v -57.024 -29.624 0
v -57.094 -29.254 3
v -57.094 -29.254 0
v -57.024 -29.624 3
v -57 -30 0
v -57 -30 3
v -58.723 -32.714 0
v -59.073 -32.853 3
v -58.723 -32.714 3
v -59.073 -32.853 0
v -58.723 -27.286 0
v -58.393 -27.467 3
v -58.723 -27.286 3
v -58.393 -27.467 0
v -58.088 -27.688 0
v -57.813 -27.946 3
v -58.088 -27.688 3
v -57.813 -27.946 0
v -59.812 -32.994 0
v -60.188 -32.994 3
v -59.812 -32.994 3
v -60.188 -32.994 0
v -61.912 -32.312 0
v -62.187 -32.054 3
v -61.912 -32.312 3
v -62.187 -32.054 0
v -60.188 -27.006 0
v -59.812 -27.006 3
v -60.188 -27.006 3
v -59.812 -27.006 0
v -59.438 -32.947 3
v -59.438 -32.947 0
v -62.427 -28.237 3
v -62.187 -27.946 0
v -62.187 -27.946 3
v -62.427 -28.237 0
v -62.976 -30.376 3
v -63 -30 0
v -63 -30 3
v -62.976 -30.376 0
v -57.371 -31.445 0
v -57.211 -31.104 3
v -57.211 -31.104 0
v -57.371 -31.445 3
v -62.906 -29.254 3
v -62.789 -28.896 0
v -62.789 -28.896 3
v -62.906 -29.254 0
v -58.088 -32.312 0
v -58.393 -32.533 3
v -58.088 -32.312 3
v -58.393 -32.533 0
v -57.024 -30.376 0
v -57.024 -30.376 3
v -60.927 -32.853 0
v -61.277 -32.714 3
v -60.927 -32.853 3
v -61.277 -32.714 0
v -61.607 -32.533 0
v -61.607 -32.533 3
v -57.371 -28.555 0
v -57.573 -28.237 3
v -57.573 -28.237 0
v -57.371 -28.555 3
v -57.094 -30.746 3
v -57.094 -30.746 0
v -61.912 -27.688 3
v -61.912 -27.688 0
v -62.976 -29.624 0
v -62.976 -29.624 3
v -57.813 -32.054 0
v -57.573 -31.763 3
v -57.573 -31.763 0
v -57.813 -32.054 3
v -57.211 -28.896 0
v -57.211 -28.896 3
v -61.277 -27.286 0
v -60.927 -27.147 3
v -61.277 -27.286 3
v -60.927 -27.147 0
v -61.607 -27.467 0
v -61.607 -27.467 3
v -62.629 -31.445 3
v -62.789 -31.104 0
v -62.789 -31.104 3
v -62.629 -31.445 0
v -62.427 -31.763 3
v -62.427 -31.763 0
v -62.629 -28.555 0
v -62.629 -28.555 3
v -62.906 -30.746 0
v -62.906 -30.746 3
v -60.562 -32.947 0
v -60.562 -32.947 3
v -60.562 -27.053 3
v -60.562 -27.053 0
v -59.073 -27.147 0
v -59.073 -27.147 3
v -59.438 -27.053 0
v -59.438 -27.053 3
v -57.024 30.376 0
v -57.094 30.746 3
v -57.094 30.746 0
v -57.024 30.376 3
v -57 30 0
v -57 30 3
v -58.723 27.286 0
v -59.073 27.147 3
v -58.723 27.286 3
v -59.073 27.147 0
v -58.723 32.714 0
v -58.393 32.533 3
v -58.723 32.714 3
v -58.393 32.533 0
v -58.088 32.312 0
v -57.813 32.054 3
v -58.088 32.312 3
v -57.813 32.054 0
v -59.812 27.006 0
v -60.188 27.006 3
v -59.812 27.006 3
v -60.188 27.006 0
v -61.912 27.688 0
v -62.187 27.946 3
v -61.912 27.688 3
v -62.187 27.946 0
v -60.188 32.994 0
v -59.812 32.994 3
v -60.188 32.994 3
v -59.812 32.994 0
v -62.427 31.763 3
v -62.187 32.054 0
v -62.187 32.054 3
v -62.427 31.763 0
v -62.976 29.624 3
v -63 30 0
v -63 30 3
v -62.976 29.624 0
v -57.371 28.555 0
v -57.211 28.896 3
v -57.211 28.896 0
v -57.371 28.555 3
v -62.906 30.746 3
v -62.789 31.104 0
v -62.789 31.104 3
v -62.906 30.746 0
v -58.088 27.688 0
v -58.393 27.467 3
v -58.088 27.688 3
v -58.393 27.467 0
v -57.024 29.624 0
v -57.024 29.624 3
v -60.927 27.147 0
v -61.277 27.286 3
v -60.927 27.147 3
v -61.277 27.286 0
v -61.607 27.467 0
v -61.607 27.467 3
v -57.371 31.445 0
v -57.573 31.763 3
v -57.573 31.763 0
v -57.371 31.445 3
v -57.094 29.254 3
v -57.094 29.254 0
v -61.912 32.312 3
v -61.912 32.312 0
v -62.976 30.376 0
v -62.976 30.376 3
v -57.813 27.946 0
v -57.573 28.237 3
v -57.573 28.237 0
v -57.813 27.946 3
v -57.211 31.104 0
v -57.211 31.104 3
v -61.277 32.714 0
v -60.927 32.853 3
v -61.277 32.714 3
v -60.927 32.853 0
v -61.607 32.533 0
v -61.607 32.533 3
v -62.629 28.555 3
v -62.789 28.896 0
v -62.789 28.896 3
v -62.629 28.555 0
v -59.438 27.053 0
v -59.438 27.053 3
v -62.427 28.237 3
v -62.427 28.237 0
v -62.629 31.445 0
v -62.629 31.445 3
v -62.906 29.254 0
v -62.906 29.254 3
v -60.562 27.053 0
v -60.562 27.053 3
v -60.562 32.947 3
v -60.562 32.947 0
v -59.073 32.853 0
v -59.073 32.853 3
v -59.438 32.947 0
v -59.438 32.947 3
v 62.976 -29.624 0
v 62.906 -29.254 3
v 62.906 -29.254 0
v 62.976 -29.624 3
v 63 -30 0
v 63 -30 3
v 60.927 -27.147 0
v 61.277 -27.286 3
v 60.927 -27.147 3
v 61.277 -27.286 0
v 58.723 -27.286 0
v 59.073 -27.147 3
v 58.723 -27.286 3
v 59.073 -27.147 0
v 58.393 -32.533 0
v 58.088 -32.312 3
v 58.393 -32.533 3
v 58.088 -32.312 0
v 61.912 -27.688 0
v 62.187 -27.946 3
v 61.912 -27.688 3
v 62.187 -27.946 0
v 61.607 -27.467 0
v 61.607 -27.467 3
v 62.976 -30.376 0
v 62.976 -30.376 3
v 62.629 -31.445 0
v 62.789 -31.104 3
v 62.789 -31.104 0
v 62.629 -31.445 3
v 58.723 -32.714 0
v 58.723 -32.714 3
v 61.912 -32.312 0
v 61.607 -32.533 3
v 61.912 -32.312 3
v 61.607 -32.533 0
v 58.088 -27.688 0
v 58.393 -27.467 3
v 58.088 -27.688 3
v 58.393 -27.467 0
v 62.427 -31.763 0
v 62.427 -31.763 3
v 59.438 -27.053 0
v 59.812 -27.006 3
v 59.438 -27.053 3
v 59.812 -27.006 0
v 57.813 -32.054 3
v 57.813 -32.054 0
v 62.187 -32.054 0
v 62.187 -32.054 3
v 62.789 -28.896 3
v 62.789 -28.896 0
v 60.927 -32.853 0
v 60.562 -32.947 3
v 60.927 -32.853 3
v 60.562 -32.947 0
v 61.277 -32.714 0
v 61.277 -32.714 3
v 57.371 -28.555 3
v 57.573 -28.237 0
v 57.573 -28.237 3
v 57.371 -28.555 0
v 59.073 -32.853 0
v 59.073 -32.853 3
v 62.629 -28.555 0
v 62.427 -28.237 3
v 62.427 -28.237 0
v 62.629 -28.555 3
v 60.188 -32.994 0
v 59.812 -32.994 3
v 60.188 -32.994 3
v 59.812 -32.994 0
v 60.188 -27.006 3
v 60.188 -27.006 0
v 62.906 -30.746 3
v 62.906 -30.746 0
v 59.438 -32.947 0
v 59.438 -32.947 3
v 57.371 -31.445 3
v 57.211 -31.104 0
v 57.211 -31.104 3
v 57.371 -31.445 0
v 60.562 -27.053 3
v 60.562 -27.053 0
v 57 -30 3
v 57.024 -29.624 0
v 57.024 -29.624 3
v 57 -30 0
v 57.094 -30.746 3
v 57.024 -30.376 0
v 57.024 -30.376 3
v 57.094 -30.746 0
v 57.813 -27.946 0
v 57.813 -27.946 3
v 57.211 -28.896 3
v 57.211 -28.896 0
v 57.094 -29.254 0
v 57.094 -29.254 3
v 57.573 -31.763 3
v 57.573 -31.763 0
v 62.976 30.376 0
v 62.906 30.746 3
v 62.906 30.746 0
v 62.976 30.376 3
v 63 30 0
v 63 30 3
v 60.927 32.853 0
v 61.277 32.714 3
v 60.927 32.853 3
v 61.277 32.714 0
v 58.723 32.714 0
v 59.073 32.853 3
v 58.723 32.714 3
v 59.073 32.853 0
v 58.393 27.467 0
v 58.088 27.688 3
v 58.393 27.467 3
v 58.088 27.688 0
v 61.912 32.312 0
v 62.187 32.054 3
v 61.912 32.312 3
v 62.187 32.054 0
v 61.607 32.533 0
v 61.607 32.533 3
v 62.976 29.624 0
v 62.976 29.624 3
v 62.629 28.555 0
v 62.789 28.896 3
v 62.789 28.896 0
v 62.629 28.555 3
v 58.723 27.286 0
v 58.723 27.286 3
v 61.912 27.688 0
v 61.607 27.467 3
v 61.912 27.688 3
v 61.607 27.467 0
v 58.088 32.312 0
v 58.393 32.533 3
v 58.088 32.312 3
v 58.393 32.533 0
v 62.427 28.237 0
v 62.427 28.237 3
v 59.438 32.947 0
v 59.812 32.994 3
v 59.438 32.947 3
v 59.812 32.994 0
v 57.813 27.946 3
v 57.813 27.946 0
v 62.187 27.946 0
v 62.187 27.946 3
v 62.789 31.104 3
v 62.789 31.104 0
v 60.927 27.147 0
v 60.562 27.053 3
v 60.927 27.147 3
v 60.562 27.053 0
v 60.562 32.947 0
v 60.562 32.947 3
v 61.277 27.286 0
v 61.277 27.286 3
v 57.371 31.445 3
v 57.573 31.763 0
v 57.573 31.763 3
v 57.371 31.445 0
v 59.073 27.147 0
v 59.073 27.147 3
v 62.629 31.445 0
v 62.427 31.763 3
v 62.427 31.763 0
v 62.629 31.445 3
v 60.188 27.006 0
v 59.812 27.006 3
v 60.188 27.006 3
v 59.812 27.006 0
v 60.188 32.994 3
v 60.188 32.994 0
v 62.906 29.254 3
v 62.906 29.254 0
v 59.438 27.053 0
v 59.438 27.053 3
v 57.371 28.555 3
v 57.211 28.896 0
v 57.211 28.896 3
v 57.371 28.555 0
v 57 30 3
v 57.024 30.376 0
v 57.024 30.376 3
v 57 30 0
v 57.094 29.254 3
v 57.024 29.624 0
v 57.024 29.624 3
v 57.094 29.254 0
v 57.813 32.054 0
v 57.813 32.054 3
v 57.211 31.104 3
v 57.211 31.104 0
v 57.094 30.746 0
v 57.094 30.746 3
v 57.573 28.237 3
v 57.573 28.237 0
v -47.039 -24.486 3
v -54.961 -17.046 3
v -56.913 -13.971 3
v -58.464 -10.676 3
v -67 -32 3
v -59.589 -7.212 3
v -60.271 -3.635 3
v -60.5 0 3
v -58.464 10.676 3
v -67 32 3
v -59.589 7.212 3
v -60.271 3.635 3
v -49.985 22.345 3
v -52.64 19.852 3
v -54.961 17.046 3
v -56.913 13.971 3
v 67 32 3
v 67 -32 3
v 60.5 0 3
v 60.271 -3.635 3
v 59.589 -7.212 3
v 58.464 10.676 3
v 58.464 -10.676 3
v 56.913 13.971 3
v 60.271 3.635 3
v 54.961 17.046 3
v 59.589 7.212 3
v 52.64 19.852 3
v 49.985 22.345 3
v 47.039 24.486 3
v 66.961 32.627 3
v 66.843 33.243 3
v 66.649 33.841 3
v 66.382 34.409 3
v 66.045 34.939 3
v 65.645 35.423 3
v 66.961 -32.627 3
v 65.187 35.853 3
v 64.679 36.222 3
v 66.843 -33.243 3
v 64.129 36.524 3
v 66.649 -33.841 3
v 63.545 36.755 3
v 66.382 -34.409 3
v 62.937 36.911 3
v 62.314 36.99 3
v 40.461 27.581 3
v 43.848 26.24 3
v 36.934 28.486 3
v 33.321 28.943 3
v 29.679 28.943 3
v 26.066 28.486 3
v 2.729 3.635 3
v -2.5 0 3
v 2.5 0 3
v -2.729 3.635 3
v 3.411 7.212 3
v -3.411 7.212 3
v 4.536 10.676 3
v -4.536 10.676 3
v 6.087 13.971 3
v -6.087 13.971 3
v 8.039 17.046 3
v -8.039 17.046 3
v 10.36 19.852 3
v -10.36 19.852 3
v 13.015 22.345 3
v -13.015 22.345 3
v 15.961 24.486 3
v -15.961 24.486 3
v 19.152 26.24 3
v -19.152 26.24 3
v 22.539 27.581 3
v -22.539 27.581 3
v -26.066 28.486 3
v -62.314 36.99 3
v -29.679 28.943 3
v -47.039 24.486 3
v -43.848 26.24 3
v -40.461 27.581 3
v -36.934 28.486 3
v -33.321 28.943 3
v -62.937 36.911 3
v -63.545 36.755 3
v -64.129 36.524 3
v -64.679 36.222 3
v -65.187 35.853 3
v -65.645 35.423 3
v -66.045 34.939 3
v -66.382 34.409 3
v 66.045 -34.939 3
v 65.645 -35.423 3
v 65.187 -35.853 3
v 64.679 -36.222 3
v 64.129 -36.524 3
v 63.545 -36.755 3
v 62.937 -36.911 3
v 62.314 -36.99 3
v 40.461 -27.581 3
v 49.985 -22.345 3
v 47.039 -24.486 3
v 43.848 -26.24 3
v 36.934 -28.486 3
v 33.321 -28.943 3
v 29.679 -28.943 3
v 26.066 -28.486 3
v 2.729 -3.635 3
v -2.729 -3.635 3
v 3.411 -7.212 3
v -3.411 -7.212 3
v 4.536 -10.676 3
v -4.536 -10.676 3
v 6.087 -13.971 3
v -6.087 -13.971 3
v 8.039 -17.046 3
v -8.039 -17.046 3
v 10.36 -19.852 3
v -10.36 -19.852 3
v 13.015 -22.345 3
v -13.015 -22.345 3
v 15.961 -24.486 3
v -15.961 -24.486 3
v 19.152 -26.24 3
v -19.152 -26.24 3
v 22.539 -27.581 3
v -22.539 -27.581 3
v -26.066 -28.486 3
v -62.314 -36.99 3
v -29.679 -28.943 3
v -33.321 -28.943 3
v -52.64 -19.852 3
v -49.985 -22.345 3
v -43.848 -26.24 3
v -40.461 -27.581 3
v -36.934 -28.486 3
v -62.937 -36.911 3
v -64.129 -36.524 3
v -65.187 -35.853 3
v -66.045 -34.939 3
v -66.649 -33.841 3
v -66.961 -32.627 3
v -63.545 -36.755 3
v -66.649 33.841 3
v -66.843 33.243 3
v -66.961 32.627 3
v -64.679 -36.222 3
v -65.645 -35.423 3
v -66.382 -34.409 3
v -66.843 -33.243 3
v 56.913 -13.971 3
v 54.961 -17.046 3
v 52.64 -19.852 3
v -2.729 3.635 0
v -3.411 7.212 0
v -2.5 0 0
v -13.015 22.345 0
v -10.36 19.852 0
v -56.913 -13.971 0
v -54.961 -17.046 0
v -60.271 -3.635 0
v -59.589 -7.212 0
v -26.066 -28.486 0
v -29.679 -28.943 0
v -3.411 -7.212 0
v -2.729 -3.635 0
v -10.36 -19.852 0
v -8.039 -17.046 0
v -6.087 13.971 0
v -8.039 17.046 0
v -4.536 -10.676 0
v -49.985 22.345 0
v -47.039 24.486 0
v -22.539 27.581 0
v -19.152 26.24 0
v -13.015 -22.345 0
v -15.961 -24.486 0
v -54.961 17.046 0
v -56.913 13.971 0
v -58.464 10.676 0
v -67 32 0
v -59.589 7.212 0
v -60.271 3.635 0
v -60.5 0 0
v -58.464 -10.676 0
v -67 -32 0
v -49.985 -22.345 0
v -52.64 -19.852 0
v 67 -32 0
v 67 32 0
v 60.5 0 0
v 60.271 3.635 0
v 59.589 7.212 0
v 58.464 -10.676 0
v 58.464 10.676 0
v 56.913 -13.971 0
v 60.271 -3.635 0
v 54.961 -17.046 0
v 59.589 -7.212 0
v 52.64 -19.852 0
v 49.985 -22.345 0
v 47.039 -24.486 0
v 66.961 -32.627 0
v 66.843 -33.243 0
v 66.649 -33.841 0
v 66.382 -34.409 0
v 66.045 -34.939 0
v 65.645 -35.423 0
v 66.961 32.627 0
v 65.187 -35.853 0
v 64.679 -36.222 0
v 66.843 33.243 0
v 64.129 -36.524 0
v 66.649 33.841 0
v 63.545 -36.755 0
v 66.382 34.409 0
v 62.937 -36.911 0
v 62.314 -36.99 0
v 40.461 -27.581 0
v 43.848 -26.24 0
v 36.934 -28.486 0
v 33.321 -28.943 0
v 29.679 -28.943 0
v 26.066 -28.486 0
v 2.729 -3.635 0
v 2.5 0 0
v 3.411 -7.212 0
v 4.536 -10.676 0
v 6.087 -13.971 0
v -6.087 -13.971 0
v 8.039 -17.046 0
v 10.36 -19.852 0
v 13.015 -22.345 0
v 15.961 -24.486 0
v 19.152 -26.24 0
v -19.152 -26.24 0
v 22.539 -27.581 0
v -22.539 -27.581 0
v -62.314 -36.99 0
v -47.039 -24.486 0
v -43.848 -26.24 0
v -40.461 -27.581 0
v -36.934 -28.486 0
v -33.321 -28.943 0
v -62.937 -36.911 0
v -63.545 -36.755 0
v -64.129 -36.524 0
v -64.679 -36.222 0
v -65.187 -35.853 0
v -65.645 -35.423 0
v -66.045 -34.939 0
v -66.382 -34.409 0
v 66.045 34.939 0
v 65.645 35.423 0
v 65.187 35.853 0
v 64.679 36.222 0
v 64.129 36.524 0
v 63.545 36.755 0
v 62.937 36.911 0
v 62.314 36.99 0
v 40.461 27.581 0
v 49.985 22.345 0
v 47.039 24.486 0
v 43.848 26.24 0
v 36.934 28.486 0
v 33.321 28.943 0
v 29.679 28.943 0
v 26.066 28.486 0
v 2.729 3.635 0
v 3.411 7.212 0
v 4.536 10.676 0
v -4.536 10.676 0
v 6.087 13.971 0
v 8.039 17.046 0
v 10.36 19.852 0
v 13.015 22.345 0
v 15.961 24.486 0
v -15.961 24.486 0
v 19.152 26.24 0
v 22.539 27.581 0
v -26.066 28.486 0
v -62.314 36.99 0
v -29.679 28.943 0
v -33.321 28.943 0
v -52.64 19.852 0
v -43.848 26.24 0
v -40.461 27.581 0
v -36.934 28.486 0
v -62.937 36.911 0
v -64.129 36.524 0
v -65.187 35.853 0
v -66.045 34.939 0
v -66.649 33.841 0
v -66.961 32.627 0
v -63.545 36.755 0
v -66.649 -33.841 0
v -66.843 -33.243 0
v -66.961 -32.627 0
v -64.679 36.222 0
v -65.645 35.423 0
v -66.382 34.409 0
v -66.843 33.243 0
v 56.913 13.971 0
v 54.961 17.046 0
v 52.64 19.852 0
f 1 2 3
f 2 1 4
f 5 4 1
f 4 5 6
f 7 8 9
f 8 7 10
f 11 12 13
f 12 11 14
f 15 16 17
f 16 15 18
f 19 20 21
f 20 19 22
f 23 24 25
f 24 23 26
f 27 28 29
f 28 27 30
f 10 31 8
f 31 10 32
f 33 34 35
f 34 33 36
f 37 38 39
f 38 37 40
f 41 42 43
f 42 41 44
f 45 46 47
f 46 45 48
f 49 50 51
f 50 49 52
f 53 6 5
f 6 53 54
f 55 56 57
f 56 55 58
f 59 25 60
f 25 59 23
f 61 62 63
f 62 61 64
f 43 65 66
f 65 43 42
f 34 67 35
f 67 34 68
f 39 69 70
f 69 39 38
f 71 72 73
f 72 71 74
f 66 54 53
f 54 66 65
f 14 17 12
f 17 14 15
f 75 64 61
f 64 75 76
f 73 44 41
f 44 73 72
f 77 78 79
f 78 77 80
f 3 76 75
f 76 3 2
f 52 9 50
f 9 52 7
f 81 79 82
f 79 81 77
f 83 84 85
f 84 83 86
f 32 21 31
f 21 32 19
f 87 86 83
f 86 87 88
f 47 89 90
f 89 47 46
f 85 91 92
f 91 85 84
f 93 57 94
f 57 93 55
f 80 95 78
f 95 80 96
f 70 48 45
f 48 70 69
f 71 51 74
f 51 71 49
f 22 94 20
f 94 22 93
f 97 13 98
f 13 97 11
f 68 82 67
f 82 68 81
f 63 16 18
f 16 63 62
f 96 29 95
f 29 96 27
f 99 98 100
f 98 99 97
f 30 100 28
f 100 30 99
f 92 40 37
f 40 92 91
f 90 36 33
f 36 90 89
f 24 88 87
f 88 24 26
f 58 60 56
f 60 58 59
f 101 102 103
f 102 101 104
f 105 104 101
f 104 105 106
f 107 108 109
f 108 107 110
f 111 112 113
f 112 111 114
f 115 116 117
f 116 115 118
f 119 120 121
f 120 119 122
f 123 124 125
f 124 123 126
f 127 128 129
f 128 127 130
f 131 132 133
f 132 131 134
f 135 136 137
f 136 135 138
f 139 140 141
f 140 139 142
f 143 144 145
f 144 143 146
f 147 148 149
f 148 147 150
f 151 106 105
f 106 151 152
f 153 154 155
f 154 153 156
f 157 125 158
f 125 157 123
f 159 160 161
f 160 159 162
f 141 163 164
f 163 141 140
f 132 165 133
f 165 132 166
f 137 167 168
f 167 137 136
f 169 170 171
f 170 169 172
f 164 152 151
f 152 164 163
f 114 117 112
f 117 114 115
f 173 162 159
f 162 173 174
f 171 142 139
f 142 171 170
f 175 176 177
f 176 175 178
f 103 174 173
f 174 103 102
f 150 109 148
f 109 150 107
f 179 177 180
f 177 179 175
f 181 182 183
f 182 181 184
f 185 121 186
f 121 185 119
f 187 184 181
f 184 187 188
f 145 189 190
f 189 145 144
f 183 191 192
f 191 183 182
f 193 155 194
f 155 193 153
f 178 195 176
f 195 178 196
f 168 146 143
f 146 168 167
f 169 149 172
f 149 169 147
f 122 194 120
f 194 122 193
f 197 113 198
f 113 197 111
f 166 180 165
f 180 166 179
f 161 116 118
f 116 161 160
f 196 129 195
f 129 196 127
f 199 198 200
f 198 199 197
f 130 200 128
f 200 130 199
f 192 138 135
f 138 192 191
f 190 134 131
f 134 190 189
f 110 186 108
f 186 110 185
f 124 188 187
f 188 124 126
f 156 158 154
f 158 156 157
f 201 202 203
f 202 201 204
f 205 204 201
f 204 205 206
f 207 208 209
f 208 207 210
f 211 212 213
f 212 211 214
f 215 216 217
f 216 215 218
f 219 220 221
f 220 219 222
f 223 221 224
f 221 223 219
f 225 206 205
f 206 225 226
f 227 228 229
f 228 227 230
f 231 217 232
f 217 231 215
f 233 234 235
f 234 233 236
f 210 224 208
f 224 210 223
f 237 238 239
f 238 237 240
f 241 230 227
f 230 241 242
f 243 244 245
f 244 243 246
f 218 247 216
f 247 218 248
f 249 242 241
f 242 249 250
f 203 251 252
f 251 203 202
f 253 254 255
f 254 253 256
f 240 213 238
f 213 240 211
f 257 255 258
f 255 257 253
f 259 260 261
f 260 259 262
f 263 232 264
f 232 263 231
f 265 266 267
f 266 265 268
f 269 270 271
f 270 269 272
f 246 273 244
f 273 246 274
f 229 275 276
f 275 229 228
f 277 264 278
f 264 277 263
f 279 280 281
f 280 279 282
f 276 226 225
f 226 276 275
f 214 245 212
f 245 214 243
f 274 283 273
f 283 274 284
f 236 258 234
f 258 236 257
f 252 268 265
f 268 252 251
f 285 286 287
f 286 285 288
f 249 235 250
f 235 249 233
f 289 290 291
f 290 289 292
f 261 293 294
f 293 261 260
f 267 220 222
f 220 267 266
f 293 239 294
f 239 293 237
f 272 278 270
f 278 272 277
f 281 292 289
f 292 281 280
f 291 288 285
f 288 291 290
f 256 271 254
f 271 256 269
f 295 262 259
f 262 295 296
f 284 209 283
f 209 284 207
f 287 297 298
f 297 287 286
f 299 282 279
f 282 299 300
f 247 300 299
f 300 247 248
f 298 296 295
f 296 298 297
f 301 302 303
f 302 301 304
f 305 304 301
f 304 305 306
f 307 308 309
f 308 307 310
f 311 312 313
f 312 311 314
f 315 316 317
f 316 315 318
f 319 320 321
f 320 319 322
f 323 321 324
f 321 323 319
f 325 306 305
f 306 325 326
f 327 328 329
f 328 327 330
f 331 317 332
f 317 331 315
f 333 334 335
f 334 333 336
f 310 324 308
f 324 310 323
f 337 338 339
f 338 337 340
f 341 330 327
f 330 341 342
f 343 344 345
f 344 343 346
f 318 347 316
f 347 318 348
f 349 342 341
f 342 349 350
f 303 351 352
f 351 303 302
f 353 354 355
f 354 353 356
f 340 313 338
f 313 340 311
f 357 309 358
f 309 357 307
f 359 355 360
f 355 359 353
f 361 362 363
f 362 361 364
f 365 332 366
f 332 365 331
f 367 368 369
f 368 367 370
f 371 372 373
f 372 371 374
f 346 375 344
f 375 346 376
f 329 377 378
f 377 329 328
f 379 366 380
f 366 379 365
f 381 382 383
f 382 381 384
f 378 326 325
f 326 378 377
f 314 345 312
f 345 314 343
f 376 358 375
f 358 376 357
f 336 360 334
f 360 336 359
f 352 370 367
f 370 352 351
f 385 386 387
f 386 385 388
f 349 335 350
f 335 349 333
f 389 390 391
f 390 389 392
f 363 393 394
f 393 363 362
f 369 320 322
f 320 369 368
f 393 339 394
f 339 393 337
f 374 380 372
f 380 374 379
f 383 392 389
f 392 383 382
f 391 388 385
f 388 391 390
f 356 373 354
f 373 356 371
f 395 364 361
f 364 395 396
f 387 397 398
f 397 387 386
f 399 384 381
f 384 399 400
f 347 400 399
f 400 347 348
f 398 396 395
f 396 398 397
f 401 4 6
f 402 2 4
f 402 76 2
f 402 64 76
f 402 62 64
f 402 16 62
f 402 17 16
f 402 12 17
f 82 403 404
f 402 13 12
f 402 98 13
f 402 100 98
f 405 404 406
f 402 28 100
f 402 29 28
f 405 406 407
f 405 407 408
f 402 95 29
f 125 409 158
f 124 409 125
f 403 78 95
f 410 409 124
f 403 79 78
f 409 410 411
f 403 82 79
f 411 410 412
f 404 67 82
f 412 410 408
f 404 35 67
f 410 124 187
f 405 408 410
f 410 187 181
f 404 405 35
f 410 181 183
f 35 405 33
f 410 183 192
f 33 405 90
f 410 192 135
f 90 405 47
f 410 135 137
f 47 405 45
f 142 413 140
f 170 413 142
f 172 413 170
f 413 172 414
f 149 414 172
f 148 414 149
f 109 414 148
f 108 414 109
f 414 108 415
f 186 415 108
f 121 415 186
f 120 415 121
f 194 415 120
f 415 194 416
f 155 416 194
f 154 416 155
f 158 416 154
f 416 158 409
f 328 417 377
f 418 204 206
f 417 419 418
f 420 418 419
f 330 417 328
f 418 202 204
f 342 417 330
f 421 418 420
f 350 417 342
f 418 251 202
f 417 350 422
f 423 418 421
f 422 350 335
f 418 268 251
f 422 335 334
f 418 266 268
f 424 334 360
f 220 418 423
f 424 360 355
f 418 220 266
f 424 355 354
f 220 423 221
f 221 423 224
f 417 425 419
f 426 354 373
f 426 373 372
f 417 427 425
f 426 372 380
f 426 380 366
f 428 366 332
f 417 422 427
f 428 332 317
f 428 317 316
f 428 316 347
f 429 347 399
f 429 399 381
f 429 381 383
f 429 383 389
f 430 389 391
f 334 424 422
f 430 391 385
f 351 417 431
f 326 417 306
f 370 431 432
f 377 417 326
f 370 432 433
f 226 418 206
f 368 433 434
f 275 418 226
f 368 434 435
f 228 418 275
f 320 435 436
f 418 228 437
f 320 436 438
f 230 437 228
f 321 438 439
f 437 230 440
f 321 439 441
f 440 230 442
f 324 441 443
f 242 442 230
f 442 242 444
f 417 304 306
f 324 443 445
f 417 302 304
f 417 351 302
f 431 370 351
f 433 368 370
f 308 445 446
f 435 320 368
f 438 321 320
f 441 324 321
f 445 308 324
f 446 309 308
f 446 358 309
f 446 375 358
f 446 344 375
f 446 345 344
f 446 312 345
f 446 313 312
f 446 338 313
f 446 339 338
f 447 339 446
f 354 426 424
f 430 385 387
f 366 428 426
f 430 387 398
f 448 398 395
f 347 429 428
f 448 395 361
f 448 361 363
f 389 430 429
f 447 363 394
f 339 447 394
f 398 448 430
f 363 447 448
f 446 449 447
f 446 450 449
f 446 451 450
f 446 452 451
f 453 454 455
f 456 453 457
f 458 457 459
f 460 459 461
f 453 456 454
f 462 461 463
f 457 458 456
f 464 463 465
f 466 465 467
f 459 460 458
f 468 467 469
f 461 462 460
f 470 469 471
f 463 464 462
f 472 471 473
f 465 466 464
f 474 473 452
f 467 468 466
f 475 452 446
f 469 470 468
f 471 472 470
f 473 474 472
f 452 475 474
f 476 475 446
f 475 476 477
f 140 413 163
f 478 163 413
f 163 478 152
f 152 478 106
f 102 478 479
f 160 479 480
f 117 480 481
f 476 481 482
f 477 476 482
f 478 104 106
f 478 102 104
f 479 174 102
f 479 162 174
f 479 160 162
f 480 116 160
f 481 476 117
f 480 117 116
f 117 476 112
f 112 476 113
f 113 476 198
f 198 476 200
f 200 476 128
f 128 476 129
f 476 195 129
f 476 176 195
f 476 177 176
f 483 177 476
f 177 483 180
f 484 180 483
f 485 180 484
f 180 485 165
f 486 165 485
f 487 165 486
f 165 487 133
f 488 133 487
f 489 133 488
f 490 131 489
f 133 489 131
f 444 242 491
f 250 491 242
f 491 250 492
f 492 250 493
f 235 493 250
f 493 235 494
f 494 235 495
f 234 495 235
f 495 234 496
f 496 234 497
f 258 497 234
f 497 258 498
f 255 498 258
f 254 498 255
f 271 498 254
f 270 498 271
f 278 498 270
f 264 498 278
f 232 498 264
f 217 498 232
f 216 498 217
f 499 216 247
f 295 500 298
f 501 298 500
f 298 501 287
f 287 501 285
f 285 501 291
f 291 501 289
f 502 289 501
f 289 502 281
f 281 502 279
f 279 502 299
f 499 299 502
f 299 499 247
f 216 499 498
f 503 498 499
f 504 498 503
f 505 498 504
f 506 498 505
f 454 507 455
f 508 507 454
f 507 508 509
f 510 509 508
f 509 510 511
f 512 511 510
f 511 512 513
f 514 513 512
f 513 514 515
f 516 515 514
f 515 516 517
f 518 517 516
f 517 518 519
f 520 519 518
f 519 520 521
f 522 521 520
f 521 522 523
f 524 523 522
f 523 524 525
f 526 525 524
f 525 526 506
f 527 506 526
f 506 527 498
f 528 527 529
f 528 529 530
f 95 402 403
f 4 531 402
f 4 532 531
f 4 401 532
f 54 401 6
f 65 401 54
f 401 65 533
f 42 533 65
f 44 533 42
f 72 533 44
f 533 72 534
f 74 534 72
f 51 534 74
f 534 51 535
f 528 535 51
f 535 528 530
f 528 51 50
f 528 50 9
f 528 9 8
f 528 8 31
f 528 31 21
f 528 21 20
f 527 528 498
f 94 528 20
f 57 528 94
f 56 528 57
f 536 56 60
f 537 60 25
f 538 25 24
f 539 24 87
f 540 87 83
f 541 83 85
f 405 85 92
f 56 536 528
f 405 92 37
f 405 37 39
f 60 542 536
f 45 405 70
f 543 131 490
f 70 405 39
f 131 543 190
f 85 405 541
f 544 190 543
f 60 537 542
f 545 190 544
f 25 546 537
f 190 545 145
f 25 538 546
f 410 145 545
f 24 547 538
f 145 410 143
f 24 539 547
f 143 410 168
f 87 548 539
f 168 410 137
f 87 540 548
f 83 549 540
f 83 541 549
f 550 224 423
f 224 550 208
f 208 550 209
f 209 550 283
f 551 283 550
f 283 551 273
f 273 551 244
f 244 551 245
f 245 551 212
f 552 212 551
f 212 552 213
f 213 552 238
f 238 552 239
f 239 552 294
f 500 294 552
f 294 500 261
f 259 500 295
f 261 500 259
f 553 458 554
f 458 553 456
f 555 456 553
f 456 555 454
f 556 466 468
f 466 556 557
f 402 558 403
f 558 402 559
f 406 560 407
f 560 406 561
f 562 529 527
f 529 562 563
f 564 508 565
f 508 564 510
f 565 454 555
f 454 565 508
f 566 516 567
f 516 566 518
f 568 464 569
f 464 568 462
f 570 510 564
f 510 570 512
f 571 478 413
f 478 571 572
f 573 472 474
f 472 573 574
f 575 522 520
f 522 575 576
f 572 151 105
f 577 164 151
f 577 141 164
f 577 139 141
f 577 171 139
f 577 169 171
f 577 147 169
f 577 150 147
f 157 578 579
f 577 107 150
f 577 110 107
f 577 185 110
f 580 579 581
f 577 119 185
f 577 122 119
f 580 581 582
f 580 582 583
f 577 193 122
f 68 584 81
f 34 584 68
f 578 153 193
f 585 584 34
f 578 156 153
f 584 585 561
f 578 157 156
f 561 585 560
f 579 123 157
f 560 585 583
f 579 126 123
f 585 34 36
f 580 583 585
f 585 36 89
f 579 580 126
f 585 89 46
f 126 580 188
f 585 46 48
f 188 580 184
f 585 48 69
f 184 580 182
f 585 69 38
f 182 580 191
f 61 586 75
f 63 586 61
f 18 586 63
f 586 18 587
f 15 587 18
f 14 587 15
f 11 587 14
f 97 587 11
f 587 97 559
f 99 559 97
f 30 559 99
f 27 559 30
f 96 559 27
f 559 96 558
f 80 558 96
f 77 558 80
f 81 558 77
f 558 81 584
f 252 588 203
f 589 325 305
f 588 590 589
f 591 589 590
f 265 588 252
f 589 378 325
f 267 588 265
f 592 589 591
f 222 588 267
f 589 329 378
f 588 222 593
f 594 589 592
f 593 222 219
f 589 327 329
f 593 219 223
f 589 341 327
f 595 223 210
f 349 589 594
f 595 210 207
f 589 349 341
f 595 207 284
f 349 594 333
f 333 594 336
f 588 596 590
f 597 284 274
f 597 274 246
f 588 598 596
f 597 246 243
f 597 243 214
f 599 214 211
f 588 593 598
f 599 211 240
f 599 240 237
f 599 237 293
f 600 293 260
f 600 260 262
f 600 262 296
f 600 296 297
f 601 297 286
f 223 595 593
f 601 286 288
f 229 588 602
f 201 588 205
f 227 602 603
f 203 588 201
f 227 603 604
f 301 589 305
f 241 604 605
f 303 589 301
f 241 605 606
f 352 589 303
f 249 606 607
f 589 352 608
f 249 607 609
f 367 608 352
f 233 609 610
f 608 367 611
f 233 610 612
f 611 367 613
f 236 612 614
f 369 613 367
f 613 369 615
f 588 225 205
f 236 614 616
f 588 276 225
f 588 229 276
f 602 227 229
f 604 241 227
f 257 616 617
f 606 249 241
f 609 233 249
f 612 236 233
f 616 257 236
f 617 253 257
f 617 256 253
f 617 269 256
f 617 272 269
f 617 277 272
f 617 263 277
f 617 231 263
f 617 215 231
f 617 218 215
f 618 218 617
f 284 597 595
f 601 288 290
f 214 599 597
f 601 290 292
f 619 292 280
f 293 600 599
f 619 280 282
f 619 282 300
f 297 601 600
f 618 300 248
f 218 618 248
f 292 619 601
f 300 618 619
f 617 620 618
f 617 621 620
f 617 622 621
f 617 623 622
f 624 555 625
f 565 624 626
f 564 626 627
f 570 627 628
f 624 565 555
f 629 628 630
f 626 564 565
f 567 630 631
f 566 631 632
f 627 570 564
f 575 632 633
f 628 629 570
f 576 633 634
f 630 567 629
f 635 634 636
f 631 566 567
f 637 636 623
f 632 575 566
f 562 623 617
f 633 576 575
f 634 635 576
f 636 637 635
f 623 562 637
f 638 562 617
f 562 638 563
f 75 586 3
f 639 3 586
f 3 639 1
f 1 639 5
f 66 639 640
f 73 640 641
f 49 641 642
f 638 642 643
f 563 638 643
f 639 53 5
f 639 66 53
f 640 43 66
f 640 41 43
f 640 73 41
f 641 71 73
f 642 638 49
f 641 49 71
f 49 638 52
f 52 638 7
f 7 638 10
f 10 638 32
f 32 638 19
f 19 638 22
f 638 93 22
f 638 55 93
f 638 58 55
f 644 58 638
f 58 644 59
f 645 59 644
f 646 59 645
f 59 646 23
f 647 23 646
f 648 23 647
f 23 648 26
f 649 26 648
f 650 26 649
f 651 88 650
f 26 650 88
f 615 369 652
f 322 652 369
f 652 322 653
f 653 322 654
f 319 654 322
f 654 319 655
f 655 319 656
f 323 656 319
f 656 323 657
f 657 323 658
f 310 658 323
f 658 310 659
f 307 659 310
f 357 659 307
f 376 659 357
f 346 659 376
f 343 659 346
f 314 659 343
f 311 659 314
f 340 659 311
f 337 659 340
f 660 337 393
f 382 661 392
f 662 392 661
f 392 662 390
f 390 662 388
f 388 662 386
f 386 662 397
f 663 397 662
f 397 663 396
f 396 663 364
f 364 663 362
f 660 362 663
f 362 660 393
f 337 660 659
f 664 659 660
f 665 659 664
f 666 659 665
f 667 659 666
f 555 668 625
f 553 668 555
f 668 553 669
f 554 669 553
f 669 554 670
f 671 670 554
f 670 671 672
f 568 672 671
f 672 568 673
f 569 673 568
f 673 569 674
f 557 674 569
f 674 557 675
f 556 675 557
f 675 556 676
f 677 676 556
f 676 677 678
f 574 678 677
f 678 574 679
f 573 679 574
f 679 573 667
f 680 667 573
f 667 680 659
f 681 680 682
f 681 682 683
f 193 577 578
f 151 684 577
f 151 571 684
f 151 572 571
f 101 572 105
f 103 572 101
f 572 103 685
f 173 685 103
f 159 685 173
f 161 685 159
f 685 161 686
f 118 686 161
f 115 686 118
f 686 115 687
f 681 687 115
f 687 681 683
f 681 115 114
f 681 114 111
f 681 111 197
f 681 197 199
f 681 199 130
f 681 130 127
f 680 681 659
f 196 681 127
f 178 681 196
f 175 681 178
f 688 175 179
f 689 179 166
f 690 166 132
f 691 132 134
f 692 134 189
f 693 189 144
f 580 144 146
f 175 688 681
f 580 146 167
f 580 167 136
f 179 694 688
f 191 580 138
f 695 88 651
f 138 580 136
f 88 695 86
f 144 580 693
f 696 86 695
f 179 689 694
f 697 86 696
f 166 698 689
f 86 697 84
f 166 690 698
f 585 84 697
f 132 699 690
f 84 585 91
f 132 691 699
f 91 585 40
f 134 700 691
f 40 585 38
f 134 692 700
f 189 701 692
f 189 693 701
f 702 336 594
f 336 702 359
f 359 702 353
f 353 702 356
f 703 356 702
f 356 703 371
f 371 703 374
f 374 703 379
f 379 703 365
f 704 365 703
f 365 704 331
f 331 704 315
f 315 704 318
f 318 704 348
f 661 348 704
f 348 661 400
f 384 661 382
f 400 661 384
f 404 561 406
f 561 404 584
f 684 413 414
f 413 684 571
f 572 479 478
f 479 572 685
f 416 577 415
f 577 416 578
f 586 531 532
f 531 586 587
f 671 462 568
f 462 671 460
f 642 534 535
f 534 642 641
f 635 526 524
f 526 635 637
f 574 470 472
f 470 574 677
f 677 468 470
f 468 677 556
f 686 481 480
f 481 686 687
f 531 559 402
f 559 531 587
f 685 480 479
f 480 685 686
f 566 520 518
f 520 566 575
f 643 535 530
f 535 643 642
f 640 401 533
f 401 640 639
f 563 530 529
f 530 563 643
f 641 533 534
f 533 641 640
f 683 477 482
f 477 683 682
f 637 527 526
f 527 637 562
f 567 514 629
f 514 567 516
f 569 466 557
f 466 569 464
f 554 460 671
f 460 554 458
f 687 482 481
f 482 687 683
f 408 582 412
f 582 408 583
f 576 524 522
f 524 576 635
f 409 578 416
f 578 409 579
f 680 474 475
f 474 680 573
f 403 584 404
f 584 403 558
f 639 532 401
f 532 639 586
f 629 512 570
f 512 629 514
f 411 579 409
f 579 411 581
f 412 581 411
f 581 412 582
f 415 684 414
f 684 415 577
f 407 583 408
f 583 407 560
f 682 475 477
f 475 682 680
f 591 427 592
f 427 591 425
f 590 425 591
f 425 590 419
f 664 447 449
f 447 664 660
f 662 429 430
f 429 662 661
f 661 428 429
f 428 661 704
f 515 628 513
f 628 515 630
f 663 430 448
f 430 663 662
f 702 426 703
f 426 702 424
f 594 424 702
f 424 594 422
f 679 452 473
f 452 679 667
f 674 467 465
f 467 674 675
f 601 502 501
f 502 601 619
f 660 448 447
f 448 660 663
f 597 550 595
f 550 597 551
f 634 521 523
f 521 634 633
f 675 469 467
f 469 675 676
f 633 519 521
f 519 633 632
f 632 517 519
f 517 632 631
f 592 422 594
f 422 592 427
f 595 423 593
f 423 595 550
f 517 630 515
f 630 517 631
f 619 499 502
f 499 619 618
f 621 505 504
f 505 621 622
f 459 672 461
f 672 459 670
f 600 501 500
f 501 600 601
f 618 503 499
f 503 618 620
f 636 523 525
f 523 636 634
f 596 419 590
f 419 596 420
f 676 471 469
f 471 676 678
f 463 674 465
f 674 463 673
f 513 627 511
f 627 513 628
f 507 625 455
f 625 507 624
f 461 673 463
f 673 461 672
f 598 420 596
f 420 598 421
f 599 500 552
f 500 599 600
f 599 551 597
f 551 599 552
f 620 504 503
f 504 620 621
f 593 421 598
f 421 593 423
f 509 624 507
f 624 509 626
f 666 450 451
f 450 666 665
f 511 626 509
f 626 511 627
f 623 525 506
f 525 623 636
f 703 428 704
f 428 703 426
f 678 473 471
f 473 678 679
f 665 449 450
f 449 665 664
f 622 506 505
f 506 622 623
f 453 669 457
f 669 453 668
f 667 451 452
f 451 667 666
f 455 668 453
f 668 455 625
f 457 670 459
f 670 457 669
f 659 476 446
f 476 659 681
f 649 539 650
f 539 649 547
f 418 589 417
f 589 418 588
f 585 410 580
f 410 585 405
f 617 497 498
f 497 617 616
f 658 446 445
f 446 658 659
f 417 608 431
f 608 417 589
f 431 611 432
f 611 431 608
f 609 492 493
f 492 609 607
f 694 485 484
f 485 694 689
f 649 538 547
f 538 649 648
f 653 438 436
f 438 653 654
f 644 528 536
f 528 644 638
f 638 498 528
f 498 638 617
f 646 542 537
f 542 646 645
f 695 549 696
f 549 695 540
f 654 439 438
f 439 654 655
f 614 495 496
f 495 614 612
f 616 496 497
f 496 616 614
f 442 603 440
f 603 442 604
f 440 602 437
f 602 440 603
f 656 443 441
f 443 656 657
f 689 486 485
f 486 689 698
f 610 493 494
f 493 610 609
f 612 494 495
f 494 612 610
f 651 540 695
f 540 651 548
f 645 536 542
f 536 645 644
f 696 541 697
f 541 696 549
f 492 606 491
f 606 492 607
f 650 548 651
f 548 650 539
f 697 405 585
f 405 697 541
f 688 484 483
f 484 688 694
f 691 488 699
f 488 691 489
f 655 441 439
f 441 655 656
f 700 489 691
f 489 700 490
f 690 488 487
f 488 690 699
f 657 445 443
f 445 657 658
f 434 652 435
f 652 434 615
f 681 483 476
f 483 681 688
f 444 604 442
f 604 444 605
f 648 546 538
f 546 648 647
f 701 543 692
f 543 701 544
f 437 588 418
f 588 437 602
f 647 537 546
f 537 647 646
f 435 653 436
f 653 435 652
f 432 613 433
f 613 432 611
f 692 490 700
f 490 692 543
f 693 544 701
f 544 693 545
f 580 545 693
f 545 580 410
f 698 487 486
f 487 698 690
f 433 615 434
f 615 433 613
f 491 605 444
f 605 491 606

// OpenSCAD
$fn = 50;


difference() {
	union() {
		hull() {
			translate(v = [-62.0000000000, 32.0000000000, 0]) {
				cylinder(h = 3, r = 5);
			}
			translate(v = [62.0000000000, 32.0000000000, 0]) {
				cylinder(h = 3, r = 5);
			}
			translate(v = [-62.0000000000, -32.0000000000, 0]) {
				cylinder(h = 3, r = 5);
			}
			translate(v = [62.0000000000, -32.0000000000, 0]) {
				cylinder(h = 3, r = 5);
			}
		}
	}
	union() {
		#translate(v = [-60.0000000000, -30.0000000000, -100.0000000000]) {
			cylinder(h = 200, r = 3.0000000000);
		}
		#translate(v = [-60.0000000000, 30.0000000000, -100.0000000000]) {
			cylinder(h = 200, r = 3.0000000000);
		}
		#translate(v = [60.0000000000, -30.0000000000, -100.0000000000]) {
			cylinder(h = 200, r = 3.0000000000);
		}
		#translate(v = [60.0000000000, 30.0000000000, -100.0000000000]) {
			cylinder(h = 200, r = 3.0000000000);
		}
		#translate(v = [-31.5000000000, 0, 0]) {
			cylinder(h = 3, r = 29.0000000000);
		}
		#translate(v = [31.5000000000, 0, 0]) {
			cylinder(h = 3, r = 29.0000000000);
		}
	}
}
